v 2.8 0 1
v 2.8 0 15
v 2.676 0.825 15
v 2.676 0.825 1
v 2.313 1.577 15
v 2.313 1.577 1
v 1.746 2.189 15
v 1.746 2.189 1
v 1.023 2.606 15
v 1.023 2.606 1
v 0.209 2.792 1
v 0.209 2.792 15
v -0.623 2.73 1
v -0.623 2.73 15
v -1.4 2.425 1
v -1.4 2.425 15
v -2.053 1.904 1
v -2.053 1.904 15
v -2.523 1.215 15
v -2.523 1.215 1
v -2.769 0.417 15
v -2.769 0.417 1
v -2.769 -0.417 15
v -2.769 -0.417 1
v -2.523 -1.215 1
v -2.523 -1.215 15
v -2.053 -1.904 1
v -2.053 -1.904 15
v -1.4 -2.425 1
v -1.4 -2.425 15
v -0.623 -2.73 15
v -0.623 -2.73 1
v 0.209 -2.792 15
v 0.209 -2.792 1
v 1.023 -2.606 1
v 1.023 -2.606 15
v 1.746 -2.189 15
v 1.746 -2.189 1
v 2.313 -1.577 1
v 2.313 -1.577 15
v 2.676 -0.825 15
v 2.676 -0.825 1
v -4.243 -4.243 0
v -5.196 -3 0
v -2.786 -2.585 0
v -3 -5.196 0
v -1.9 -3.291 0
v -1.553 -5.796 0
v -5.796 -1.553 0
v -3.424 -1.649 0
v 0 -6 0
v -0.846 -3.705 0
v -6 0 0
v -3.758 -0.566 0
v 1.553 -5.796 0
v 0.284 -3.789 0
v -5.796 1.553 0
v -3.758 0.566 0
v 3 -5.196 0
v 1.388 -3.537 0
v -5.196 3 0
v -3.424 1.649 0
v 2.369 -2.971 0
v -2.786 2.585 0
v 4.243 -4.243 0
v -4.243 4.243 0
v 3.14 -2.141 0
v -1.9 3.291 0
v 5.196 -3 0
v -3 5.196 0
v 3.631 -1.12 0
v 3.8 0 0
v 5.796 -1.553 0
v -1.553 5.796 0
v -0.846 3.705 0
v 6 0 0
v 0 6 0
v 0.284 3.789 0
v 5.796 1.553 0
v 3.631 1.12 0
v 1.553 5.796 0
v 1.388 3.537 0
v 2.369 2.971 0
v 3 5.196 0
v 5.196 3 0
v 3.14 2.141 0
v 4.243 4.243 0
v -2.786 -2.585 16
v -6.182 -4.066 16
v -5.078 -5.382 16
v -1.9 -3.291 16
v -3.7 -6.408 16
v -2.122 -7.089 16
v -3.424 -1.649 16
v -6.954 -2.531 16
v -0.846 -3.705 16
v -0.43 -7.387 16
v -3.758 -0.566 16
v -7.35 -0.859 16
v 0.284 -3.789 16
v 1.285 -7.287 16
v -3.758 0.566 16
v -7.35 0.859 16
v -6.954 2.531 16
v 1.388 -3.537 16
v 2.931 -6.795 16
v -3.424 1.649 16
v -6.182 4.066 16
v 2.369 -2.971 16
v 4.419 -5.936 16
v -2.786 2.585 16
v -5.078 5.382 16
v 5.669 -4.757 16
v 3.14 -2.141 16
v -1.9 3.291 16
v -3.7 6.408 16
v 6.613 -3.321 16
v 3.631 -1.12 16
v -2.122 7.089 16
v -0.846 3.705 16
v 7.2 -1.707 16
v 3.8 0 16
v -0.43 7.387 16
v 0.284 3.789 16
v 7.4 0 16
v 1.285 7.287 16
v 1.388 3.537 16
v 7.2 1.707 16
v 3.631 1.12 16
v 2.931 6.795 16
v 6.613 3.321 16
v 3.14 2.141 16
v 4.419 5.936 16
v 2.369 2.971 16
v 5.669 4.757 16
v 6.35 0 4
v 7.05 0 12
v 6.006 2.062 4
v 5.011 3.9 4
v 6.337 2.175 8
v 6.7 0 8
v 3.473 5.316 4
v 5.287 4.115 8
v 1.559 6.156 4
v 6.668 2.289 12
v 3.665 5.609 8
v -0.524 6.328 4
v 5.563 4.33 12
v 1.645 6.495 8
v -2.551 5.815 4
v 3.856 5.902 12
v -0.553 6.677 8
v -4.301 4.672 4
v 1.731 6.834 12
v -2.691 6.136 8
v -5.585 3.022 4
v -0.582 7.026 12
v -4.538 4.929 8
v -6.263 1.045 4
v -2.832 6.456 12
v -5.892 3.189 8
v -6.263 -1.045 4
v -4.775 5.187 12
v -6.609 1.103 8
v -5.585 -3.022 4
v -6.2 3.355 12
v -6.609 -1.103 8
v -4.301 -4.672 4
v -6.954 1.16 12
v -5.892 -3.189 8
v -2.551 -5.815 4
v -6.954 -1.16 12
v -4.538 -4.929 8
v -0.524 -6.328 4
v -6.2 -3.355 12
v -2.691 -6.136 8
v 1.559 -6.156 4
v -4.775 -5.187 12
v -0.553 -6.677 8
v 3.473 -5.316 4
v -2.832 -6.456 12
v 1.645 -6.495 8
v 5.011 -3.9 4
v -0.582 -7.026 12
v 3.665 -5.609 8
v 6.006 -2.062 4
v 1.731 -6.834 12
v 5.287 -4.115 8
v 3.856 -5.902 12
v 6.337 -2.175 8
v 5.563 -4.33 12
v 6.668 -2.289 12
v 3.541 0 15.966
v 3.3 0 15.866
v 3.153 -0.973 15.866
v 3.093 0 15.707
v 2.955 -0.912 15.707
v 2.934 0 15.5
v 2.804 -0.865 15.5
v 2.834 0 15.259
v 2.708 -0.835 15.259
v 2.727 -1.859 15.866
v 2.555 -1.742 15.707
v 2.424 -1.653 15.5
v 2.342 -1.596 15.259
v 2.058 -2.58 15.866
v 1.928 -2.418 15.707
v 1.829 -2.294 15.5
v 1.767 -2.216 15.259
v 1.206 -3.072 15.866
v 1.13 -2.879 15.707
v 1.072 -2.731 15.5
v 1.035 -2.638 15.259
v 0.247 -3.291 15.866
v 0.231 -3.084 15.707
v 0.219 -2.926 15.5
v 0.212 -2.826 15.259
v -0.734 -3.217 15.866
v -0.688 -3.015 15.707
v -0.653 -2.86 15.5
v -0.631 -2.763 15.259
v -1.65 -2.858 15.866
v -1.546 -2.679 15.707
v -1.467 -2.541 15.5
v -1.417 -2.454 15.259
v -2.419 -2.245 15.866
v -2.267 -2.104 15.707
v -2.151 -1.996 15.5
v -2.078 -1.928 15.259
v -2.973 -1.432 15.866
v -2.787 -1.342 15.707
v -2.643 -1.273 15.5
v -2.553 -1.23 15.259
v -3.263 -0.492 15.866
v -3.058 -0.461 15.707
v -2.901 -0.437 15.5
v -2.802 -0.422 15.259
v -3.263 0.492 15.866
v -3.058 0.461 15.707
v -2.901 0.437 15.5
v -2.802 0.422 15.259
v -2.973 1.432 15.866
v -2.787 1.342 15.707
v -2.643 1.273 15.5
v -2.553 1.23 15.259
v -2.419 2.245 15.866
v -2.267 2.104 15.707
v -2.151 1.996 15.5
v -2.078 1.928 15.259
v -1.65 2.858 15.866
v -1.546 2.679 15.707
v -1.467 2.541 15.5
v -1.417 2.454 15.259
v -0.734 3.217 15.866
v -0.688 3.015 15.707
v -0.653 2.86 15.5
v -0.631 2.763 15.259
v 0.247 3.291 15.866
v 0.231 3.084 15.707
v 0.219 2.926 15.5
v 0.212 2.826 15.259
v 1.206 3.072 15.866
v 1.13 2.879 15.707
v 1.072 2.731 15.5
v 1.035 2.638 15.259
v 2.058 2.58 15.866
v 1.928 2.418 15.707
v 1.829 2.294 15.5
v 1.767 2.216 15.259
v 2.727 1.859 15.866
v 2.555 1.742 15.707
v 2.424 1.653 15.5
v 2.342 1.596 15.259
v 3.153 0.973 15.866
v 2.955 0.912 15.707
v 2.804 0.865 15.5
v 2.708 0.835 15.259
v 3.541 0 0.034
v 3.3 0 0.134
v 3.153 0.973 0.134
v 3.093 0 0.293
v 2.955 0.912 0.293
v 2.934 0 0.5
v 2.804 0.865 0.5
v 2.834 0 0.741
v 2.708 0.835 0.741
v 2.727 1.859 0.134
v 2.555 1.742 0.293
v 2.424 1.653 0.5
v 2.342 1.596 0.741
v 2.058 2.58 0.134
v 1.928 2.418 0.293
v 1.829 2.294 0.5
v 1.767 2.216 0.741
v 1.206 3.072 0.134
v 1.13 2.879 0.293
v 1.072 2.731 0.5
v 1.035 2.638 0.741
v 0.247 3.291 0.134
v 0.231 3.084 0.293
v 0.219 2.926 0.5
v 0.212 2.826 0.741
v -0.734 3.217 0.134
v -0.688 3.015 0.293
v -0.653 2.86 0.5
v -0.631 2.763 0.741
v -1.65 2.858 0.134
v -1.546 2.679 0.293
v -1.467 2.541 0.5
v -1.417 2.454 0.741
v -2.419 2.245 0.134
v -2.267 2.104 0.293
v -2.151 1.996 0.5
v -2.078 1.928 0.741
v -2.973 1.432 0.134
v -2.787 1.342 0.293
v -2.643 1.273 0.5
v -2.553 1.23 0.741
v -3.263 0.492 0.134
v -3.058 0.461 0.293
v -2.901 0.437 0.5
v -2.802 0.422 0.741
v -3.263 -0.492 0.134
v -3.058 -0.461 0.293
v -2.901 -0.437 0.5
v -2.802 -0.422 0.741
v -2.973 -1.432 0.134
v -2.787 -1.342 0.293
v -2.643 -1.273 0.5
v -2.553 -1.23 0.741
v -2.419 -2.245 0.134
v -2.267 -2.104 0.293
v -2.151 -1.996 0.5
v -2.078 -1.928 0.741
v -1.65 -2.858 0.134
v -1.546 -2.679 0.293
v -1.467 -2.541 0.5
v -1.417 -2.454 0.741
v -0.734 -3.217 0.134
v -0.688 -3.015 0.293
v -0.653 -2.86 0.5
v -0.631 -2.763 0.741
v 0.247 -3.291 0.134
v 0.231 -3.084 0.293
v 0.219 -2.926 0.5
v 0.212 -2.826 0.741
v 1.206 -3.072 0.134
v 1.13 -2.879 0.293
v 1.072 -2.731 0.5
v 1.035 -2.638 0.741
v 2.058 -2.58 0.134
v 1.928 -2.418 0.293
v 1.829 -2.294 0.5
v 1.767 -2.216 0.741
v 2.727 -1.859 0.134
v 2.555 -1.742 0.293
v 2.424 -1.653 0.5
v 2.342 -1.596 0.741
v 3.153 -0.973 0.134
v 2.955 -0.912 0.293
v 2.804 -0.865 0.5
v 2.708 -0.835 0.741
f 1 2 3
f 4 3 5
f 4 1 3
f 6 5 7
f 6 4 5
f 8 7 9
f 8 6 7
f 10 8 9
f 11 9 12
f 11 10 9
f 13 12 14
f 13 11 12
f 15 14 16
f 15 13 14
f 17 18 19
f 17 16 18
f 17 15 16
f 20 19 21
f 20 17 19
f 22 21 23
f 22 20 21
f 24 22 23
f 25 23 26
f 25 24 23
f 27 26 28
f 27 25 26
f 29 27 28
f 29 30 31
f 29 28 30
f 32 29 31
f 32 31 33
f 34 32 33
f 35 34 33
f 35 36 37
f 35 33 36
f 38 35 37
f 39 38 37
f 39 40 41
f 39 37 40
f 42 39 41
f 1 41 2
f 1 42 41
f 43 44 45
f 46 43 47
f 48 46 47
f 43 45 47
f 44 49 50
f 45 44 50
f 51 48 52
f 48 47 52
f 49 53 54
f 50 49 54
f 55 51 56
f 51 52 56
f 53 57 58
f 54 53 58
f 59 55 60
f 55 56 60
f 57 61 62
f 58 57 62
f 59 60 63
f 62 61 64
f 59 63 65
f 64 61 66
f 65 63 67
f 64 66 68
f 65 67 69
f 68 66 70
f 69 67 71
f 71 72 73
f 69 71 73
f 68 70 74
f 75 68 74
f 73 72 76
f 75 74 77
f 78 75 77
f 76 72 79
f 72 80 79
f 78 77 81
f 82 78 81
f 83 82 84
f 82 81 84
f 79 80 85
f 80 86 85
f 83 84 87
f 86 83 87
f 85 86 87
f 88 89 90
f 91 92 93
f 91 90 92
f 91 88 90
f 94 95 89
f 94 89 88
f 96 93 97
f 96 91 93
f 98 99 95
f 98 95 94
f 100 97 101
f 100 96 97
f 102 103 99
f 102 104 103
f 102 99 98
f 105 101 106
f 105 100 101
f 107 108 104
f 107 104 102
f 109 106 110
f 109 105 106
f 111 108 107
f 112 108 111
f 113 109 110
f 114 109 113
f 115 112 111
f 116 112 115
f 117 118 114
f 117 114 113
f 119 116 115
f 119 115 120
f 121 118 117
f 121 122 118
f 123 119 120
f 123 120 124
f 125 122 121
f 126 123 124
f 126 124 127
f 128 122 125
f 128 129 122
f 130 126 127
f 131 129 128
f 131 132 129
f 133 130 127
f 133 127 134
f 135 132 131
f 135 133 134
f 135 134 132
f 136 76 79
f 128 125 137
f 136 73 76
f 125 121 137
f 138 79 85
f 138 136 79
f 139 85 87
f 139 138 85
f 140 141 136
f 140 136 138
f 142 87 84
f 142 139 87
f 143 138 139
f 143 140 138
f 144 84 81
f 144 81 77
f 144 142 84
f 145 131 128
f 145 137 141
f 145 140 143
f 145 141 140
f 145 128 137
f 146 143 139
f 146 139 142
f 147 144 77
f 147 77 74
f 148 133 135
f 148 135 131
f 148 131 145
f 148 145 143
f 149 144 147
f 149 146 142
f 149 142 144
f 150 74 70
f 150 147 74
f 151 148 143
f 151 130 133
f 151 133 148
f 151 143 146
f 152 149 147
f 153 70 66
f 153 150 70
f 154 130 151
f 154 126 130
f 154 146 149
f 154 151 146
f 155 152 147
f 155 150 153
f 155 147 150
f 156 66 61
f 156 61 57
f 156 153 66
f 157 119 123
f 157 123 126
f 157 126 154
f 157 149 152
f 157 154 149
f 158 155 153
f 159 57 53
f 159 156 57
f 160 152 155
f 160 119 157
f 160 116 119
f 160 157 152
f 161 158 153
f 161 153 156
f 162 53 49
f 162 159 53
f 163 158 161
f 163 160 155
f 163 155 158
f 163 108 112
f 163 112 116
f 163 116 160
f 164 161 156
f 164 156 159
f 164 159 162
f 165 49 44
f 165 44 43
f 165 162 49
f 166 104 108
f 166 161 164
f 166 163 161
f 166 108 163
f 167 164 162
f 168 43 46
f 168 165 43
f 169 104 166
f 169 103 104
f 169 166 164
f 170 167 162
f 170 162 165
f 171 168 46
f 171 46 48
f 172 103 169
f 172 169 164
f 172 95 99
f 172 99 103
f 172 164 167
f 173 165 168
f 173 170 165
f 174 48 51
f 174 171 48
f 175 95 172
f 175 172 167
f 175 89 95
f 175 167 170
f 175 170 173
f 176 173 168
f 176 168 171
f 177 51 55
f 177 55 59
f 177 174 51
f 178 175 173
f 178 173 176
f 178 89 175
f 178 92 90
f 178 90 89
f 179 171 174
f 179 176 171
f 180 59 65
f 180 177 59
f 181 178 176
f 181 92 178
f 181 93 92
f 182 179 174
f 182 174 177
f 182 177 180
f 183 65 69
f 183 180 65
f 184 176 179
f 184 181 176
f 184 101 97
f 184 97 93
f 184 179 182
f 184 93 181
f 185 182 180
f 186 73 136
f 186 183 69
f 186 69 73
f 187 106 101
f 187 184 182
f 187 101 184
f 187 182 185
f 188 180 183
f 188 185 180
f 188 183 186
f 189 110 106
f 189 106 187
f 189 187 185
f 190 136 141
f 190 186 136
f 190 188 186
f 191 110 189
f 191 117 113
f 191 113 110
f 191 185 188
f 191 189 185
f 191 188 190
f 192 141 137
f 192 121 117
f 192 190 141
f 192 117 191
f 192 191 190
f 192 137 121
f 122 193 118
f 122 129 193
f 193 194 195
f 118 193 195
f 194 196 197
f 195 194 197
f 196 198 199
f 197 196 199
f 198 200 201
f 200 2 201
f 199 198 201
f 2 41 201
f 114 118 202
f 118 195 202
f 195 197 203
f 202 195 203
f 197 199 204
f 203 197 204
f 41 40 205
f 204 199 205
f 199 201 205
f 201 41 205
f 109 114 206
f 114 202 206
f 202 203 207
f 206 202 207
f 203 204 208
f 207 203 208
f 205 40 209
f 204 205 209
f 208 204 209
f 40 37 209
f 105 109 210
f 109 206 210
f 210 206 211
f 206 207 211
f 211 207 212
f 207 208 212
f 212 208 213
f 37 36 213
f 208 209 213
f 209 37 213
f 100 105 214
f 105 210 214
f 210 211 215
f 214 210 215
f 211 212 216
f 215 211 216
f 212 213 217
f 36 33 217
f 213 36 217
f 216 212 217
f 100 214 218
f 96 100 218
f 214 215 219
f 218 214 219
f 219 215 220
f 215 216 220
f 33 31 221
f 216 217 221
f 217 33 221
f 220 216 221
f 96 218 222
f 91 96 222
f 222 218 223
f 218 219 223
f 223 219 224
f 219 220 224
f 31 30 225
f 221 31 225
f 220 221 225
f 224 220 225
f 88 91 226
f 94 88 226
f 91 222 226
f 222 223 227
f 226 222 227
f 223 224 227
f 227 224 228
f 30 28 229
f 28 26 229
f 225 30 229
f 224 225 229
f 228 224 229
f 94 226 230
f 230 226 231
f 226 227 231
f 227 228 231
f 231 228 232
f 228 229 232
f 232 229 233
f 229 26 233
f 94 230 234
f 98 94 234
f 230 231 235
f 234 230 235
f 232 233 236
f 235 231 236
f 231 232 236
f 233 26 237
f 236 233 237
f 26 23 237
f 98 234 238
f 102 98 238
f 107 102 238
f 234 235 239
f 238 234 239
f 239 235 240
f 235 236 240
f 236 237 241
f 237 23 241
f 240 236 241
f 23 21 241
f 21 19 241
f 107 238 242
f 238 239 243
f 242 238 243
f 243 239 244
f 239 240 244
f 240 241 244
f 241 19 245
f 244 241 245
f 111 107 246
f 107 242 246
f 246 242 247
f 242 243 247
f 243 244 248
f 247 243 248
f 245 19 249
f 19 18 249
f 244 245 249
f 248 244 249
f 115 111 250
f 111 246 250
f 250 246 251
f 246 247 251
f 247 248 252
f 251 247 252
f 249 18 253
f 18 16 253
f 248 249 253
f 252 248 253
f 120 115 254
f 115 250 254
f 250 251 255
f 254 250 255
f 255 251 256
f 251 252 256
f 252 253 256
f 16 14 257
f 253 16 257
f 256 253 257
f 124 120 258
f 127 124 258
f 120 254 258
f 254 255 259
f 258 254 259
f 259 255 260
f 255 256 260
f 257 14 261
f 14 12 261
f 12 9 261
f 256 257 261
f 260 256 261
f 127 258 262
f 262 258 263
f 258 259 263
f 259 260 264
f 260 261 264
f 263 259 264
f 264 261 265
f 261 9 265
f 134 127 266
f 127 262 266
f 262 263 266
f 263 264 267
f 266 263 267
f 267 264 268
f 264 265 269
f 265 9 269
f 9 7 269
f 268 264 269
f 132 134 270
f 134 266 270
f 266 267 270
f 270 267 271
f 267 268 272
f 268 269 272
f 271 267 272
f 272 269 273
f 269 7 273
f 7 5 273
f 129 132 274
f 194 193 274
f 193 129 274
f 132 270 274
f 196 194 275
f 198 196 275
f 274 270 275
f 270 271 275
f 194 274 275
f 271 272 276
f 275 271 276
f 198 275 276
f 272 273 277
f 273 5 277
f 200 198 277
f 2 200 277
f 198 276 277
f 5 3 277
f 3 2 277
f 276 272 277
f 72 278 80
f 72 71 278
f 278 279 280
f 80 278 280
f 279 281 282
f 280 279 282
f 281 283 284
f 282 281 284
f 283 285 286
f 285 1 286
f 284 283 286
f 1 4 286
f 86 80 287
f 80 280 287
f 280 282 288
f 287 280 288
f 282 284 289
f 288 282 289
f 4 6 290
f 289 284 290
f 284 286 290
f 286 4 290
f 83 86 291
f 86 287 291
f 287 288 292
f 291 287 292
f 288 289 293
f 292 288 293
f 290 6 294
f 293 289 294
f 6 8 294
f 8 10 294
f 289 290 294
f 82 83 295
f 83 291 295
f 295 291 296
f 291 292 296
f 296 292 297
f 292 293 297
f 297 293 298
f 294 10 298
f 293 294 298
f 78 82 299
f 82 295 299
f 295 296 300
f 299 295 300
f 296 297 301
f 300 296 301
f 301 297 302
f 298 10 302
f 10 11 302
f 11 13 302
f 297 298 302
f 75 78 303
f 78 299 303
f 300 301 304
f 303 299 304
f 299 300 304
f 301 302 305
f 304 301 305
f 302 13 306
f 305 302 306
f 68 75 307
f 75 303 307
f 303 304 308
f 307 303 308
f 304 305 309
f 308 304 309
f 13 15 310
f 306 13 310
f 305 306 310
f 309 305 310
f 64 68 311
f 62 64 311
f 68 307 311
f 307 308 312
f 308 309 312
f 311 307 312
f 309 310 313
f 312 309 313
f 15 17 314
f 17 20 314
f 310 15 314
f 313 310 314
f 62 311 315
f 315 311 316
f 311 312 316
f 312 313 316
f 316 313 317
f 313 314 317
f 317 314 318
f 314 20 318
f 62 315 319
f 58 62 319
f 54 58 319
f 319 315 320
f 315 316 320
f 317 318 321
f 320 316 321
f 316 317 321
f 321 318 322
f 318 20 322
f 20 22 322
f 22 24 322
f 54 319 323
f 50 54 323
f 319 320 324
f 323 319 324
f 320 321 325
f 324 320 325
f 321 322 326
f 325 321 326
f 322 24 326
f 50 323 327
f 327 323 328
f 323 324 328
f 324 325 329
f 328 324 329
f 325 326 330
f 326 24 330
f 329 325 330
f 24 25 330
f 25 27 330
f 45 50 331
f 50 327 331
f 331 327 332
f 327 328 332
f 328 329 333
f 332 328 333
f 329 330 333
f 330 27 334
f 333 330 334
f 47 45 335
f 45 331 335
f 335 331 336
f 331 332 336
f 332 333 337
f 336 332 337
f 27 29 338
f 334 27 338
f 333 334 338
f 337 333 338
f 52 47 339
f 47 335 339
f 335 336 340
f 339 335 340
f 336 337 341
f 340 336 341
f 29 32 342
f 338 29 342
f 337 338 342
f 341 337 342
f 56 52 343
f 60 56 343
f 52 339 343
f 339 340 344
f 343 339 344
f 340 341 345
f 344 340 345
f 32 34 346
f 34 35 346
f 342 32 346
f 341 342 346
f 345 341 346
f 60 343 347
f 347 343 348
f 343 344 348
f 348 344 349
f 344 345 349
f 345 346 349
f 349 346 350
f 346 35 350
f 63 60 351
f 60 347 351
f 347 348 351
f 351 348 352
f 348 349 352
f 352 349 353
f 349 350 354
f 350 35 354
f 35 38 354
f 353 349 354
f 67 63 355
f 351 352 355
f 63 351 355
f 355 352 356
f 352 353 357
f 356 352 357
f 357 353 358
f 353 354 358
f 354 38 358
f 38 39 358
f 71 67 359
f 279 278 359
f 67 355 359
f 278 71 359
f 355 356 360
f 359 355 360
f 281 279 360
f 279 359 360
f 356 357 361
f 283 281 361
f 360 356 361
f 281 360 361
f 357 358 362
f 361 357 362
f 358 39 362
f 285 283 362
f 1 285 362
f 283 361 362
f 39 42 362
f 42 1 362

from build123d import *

# Parameters (mm, degrees)
F0_R     = 6
F0_R_2   = 2.8
F1_DEPTH = 16
F1_TAPER = -5
F2_DEPTH = 16.0010001
F3_R     = 1


with BuildPart() as f1:
    # F0 (on Top) → F1 (new body)
    with BuildSketch(Plane.XY):
        Circle(F0_R)
        Circle(F0_R_2, mode=Mode.SUBTRACT)
    extrude(amount=F1_DEPTH, taper=F1_TAPER)

    # F0 (on Top) → F2 (cut, through all)
    with BuildSketch(Plane.XY):
        Circle(F0_R_2)
    extrude(amount=F2_DEPTH, mode=Mode.SUBTRACT)

    # F3
    f3_edges = [f1.edges().sort_by_distance(p)[0] for p in [
        (-2.8, 0, 16),
        (-2.8, 0, 0),
    ]]
    fillet(f3_edges, radius=F3_R)


solid = f1.part
